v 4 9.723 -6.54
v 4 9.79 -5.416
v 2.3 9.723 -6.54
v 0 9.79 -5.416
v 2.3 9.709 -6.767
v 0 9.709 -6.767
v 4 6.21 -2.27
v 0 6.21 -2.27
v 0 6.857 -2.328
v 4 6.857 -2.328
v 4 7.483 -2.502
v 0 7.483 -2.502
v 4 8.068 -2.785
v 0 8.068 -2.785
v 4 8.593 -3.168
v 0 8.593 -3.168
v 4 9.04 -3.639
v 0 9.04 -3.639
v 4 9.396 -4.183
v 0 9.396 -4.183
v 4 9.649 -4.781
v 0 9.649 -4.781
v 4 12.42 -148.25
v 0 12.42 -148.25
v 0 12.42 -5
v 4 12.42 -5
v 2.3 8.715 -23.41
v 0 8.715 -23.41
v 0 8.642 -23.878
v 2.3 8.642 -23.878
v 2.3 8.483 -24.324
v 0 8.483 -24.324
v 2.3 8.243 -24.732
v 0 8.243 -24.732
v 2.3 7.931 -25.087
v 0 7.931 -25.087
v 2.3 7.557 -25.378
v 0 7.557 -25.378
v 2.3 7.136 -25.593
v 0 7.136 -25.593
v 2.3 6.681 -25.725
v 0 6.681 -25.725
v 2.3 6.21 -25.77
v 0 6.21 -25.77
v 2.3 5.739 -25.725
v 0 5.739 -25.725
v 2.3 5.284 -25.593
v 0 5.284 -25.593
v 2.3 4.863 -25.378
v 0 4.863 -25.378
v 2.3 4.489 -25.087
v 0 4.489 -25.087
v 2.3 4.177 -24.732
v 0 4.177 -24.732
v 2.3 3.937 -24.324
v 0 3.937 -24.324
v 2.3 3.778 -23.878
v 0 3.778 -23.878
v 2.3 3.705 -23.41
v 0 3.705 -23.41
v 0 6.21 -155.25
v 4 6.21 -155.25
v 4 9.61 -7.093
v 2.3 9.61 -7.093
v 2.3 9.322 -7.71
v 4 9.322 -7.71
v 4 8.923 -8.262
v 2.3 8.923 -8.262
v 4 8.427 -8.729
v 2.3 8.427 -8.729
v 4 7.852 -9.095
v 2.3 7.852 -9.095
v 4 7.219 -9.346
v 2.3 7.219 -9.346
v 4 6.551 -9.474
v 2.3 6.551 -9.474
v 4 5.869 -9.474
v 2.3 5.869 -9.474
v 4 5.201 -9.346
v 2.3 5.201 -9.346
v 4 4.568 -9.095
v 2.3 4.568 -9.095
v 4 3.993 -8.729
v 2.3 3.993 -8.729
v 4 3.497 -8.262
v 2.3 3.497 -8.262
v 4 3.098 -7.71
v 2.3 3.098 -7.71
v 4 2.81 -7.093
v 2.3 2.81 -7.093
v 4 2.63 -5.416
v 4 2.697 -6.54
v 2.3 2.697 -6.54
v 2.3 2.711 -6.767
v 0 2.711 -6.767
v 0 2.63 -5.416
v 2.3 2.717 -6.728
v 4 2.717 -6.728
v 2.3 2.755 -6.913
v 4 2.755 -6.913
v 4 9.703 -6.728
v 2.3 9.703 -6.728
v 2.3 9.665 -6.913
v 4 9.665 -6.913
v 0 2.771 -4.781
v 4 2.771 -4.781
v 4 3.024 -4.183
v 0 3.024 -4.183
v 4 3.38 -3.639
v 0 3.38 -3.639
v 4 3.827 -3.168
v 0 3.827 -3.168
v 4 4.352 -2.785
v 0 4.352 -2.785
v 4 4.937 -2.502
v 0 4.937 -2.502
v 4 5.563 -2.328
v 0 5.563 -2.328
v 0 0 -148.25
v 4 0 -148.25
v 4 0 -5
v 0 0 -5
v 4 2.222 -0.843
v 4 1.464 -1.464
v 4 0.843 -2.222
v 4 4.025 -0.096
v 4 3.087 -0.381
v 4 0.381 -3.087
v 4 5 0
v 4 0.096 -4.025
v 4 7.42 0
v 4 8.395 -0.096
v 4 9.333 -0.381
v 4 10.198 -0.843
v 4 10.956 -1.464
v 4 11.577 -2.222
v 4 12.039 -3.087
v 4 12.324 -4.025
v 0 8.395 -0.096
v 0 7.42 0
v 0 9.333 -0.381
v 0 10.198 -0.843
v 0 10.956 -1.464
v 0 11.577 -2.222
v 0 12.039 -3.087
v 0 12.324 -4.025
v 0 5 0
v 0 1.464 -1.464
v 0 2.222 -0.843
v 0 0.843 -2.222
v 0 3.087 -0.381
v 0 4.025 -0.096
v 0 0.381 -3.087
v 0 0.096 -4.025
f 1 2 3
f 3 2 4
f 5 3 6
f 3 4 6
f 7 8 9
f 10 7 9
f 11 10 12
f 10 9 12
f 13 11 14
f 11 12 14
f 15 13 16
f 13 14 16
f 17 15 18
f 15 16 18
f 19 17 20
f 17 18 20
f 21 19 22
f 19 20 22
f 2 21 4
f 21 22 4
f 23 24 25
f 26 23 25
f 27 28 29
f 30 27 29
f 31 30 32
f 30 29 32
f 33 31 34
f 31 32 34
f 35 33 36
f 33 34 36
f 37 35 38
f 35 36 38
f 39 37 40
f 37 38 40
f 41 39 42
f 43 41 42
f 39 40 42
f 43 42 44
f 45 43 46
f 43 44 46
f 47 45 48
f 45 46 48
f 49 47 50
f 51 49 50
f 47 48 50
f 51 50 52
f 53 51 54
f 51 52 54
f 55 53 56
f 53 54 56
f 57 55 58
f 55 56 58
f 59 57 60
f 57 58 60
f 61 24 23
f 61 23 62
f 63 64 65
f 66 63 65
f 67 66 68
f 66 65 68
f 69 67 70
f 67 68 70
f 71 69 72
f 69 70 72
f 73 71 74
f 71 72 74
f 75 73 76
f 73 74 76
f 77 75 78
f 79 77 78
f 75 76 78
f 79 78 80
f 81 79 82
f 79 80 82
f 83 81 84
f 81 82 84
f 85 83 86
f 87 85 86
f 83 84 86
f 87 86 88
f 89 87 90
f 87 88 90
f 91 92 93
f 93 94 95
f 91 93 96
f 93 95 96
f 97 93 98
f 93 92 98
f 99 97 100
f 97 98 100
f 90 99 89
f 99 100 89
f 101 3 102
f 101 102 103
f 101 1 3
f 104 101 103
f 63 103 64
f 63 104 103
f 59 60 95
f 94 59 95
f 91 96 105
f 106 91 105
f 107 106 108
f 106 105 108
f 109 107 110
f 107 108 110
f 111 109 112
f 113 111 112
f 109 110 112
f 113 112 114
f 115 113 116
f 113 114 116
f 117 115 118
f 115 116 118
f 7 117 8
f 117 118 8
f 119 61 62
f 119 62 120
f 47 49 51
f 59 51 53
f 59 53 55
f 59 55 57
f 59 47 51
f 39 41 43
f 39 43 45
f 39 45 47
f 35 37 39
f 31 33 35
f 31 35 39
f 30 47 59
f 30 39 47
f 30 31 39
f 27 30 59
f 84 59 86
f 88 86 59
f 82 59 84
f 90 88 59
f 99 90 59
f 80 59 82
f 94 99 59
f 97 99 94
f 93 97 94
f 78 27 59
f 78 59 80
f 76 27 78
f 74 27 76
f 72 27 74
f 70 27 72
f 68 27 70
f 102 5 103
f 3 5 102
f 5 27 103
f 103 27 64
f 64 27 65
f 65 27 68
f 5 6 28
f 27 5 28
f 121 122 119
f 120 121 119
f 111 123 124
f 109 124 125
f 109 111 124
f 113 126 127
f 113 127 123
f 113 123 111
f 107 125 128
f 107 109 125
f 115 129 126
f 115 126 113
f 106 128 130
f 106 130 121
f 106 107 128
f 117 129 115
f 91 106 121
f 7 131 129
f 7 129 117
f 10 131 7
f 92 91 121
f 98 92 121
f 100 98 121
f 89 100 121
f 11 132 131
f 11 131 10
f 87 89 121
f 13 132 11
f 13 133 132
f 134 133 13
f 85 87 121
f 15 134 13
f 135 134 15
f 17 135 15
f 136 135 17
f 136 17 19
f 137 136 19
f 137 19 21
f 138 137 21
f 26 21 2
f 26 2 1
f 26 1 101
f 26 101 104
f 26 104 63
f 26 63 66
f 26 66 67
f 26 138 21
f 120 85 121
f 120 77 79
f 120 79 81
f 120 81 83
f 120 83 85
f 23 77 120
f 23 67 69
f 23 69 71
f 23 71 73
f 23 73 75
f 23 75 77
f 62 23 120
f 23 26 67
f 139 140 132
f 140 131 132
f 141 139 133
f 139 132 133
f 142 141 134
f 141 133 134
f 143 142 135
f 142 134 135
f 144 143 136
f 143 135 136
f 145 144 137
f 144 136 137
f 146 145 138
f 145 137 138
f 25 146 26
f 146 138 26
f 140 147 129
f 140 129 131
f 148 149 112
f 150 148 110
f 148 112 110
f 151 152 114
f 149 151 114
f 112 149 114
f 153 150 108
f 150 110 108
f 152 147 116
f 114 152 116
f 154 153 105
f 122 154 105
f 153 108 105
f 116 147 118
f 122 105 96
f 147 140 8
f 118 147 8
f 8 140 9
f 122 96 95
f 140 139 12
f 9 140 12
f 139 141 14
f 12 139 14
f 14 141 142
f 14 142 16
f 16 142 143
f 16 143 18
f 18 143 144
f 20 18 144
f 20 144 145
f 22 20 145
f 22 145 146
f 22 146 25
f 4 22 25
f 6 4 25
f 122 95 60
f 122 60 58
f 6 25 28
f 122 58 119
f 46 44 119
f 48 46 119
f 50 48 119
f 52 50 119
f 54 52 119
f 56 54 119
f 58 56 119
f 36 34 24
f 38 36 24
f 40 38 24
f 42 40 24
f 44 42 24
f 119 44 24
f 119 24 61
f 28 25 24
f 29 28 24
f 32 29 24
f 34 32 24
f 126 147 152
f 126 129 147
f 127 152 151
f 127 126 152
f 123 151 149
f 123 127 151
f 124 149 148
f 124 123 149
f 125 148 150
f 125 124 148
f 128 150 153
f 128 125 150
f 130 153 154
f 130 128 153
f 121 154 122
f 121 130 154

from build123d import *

# Parameters (mm, degrees)
SKETCH1_W           = 135.25
SKETCH1_H           = 12.42
BOSS_EXTRUDE1_DEPTH = 4
CUT_EXTRUDE1_DEPTH  = 156.797364869
CUT_EXTRUDE2_DEPTH  = 2.3
FILLET1_R           = 5
FILLET2_R           = 2


with BuildPart() as part:
    # Sketch1 → Boss-Extrude1 (new body)
    with BuildSketch(Plane(origin=(0, 0, 0), x_dir=(0, 0, -1), z_dir=(1, 0, 0))):
        with Locations((67.625, 6.21)):
            Rectangle(SKETCH1_W, SKETCH1_H)
        Polygon((148.25, 0), (135.25, 0), (135.25, 12.42), (148.25, 12.42), (155.25, 6.21), align=None)
    extrude(amount=BOSS_EXTRUDE1_DEPTH)

    # Sketch7 → Cut-Extrude1 (cut, through all)
    with BuildSketch(Plane.ZY):
        with BuildLine():
            ThreePointArc((-2.27, 6.21), (-3.168108515, 8.592801832), (-5.415564859, 9.79))
            Line((-5.415564859, 9.79), (-6.76734979, 9.709244254))
            ThreePointArc((-6.76734979, 9.709244254), (-9.49, 6.21), (-6.76734979, 2.710755746))
            Line((-6.76734979, 2.710755746), (-5.415564859, 2.63))
            ThreePointArc((-5.415564859, 2.63), (-3.168108515, 3.827198168), (-2.27, 6.21))
        make_face()
    extrude(amount=-CUT_EXTRUDE1_DEPTH, mode=Mode.SUBTRACT)

    # Sketch7<3> → Cut-Extrude2 (cut)
    with BuildSketch(Plane.ZY):
        with BuildLine():
            ThreePointArc((-6.76734979, 2.710755746), (-9.49, 6.21), (-6.76734979, 9.709244254))
            Line((-6.76734979, 9.709244254), (-23.410182873, 8.715))
            ThreePointArc((-23.410182873, 8.715), (-25.77, 6.21), (-23.410182873, 3.705))
            Line((-23.410182873, 3.705), (-6.76734979, 2.710755746))
        make_face()
    extrude(amount=-CUT_EXTRUDE2_DEPTH, mode=Mode.SUBTRACT)

    # Fillet1
    fillet1_edges = [part.edges().sort_by_distance(p)[0] for p in [
        (2, 0, 0),
        (2, 12.42, 0),
    ]]
    fillet(fillet1_edges, radius=FILLET1_R)

    # Fillet2
    fillet2_edges = [part.edges().sort_by_distance(p)[0] for p in [
        (3.15, 9.709244254, -6.76734979),
        (3.15, 2.710755746, -6.76734979),
    ]]
    fillet(fillet2_edges, radius=FILLET2_R)


solid = part.part
